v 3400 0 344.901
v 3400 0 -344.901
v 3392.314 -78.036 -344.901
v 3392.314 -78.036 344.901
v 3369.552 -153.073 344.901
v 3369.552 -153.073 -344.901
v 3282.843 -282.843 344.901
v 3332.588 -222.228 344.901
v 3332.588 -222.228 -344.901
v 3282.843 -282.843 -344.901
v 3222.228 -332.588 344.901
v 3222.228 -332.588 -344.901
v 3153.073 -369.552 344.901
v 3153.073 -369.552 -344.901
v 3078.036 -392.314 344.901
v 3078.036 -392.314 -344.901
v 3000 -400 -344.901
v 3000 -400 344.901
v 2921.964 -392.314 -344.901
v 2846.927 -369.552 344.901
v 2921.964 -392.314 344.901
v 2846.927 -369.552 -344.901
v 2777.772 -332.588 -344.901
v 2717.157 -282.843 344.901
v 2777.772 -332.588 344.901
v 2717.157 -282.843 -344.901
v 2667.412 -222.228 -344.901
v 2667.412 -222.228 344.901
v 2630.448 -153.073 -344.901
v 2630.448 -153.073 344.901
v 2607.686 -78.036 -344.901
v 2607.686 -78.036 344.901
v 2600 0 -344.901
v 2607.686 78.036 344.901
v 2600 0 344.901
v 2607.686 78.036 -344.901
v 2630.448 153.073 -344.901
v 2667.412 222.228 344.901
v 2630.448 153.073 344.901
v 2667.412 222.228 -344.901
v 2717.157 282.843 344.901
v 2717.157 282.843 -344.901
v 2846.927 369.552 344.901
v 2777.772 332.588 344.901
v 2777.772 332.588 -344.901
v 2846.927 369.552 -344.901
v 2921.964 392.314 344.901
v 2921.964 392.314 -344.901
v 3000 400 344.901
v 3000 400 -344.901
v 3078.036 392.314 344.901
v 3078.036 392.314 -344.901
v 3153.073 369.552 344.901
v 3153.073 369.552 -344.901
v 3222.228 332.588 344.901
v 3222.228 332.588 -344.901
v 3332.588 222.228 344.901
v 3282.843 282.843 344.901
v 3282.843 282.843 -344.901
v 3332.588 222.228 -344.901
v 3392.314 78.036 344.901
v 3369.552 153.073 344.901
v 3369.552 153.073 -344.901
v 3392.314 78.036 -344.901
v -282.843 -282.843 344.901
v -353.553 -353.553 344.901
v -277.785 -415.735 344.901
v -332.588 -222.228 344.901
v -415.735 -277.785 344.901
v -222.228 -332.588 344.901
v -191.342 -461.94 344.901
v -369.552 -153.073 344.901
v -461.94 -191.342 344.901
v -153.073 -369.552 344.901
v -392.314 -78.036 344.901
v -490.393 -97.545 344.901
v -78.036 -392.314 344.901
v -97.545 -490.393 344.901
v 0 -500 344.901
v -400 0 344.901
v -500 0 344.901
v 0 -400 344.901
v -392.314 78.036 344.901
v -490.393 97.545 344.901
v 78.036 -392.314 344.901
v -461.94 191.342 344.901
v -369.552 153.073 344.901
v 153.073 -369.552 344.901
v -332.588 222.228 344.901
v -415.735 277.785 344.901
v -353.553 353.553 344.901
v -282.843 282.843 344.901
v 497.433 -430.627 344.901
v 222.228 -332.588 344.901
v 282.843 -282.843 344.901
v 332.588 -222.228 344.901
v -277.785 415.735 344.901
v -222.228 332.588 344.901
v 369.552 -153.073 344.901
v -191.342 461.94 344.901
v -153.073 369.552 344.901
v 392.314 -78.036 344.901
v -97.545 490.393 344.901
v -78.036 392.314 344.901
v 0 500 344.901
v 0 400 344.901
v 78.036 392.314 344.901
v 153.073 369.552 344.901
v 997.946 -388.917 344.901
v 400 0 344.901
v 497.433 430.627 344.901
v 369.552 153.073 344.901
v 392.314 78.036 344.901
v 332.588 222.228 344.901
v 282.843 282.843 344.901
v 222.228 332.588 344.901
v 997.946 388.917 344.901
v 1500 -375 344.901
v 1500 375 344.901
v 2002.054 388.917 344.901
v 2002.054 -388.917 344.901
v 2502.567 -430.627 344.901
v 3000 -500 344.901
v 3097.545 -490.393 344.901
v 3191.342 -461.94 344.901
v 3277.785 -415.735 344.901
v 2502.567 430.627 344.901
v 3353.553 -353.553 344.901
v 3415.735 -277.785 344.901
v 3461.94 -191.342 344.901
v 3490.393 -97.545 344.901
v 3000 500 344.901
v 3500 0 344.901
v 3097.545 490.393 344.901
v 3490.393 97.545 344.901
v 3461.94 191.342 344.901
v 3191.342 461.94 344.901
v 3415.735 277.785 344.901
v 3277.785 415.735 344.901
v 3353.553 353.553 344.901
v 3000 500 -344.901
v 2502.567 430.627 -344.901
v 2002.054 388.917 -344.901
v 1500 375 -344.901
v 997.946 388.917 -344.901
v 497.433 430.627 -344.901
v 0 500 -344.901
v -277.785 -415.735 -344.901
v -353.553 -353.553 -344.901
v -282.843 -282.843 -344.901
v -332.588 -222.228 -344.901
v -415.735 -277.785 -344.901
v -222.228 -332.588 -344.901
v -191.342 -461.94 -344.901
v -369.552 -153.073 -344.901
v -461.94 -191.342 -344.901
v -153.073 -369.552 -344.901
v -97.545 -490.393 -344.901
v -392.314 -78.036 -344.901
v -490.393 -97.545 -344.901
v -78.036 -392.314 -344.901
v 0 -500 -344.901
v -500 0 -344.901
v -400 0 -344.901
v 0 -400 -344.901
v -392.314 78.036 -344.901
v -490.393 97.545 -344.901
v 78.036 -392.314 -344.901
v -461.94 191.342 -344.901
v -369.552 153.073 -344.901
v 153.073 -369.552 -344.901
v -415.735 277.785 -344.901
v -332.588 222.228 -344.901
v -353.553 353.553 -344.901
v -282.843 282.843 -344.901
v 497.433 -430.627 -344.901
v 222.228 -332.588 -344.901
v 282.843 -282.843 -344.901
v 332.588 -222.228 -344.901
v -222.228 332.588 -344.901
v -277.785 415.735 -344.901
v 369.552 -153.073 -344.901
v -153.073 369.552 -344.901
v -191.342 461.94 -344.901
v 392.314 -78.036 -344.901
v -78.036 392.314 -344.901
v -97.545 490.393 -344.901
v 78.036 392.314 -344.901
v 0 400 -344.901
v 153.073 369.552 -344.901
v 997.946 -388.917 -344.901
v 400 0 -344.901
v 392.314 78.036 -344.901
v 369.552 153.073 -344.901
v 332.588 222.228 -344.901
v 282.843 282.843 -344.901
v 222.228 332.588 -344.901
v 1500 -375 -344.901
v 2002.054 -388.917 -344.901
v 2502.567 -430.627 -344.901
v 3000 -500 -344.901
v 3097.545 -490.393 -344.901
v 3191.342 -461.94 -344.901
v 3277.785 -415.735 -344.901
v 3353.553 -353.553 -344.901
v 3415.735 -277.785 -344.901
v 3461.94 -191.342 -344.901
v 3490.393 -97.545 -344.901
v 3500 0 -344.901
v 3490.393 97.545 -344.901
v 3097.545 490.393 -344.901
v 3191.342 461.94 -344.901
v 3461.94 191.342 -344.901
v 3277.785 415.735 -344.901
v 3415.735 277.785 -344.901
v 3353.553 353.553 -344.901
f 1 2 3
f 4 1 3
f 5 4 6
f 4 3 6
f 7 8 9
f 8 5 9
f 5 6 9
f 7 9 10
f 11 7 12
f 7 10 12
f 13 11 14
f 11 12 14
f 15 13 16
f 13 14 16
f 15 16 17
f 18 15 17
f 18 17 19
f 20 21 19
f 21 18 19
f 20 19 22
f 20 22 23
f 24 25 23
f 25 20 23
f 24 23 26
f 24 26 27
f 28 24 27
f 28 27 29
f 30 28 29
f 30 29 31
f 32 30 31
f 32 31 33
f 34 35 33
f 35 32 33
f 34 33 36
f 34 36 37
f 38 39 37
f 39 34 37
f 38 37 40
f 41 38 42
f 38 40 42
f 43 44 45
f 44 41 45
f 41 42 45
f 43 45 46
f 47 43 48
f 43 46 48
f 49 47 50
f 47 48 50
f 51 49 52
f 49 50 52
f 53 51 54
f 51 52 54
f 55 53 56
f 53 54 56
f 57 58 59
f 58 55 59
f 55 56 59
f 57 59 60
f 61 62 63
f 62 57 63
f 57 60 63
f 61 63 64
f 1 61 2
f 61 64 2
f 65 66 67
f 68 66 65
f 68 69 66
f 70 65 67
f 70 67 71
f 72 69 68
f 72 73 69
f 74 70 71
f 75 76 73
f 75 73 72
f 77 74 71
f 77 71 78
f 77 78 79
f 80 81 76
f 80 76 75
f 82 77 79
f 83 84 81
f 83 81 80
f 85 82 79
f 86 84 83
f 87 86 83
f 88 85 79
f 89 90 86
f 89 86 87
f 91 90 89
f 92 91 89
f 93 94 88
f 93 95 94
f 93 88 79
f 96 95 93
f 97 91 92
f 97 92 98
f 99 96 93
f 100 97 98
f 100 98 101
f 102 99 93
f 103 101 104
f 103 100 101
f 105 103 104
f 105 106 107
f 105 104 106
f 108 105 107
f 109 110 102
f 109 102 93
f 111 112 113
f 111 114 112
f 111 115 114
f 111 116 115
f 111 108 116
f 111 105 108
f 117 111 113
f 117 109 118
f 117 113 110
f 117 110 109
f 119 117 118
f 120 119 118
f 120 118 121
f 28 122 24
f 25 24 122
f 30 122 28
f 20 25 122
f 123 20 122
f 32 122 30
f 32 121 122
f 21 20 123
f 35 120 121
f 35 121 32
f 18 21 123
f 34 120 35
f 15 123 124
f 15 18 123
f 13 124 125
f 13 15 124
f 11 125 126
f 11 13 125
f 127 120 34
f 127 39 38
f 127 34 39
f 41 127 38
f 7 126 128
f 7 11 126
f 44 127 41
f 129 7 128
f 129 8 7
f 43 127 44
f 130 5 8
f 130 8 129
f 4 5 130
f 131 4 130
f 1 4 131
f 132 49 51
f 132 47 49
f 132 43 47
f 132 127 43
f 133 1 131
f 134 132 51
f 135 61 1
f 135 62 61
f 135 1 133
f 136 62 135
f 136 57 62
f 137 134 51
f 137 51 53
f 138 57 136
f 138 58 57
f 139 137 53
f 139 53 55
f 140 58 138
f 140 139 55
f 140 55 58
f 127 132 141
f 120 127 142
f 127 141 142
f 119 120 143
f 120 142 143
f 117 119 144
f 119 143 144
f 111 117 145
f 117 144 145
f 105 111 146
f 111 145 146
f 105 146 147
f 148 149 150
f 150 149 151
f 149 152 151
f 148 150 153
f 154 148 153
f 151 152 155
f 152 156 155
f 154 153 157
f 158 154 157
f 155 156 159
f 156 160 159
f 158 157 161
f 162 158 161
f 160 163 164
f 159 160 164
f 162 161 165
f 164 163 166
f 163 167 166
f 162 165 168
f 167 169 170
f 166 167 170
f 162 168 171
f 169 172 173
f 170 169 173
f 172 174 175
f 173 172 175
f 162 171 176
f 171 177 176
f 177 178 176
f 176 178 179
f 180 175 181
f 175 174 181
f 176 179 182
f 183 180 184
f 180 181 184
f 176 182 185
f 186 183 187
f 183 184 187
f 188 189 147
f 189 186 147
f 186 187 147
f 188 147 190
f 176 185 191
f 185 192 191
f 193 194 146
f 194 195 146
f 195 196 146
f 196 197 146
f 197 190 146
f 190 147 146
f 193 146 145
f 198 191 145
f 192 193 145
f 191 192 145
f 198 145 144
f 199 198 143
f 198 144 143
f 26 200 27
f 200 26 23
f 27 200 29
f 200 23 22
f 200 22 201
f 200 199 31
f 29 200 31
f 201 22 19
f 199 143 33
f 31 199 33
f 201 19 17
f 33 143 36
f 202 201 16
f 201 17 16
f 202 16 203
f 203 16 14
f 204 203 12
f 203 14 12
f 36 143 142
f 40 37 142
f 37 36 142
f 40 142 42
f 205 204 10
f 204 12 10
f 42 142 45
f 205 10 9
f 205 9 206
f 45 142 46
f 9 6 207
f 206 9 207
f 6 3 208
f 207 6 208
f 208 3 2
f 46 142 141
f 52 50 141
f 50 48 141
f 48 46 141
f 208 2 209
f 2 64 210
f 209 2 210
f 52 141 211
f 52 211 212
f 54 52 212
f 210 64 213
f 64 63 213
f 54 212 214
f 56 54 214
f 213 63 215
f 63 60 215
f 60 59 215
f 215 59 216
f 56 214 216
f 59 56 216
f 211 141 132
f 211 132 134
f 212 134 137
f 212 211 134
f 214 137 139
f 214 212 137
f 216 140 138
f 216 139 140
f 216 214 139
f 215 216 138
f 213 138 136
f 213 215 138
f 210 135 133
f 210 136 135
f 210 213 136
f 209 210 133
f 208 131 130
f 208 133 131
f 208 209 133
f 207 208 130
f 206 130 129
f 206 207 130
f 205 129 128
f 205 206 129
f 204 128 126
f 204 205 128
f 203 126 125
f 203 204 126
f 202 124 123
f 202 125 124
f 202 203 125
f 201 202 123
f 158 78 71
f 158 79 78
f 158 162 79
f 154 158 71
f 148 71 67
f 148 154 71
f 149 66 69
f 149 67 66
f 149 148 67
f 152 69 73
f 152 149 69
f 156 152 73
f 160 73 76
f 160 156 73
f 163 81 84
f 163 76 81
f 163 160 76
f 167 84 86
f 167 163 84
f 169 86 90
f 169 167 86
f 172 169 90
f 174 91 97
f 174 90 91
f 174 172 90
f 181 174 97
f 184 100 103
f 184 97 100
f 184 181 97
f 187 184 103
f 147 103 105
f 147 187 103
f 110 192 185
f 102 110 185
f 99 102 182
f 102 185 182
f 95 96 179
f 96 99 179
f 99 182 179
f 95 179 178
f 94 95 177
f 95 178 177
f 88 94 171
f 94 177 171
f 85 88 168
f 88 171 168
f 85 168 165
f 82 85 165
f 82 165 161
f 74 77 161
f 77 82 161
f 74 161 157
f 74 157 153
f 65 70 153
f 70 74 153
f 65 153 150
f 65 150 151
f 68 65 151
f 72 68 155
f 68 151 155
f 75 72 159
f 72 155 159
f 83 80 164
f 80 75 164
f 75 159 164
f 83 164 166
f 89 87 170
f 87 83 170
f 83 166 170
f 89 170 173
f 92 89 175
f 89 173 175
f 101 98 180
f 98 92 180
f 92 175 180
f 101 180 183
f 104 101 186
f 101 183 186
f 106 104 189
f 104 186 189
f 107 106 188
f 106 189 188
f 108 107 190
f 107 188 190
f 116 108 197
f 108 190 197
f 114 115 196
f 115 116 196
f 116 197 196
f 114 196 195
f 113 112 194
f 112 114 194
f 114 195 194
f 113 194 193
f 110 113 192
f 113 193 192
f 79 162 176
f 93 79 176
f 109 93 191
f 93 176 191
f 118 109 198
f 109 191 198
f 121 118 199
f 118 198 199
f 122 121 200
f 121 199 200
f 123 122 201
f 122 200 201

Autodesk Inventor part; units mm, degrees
ref_plane "YZ Plane" through (0, 0, 0) normal (1, 0, 0) x (0, 1, 0)
ref_plane "XZ Plane" through (0, 0, 0) normal (0, 1, 0) x (-1, 0, 0)
ref_plane "XY Plane" through (0, 0, 0) normal (0, 0, 1) x (1, 0, 0)
sketch "Sketch1" plane through (0, 0, 0) normal (0, 0, 1) x (1, 0, 0)
  arc A0 (155.0242, 475.3604) -> (155.0242, -475.3604) centre (0, 0) ccw
  arc A1 (2844.9758, -475.3604) -> (2844.9758, 475.3604) centre (3000, 0) ccw
  arc A2 (0, 500) -> (3000, 500) centre (1500, 9437.5) ccw
  line L0 (0, 0) -> (3000, 0) construction
  arc A3 (3000, -500) -> (0, -500) centre (1500, -9437.5) ccw
  circle A4 centre (0, 0) radius 400
  circle A5 centre (3000, 0) radius 400
  point P0 (0, -500)
  point P1 (3000, -500)
  dimension "d0" = 1000
  dimension "d1" = 1000
  dimension "d2" = 3000
  dimension "d4" = 9062.5
  dimension "d5" = 9437.5
  dimension "d6" = 500
  dimension "d7" = 800
  dimension "d8" = 800
extrude "Extrusion1" add sketch "Sketch1" along normal mid plane 689.802 contours A2 A1 A3 A0
properties part number "04_Ramię-1"
